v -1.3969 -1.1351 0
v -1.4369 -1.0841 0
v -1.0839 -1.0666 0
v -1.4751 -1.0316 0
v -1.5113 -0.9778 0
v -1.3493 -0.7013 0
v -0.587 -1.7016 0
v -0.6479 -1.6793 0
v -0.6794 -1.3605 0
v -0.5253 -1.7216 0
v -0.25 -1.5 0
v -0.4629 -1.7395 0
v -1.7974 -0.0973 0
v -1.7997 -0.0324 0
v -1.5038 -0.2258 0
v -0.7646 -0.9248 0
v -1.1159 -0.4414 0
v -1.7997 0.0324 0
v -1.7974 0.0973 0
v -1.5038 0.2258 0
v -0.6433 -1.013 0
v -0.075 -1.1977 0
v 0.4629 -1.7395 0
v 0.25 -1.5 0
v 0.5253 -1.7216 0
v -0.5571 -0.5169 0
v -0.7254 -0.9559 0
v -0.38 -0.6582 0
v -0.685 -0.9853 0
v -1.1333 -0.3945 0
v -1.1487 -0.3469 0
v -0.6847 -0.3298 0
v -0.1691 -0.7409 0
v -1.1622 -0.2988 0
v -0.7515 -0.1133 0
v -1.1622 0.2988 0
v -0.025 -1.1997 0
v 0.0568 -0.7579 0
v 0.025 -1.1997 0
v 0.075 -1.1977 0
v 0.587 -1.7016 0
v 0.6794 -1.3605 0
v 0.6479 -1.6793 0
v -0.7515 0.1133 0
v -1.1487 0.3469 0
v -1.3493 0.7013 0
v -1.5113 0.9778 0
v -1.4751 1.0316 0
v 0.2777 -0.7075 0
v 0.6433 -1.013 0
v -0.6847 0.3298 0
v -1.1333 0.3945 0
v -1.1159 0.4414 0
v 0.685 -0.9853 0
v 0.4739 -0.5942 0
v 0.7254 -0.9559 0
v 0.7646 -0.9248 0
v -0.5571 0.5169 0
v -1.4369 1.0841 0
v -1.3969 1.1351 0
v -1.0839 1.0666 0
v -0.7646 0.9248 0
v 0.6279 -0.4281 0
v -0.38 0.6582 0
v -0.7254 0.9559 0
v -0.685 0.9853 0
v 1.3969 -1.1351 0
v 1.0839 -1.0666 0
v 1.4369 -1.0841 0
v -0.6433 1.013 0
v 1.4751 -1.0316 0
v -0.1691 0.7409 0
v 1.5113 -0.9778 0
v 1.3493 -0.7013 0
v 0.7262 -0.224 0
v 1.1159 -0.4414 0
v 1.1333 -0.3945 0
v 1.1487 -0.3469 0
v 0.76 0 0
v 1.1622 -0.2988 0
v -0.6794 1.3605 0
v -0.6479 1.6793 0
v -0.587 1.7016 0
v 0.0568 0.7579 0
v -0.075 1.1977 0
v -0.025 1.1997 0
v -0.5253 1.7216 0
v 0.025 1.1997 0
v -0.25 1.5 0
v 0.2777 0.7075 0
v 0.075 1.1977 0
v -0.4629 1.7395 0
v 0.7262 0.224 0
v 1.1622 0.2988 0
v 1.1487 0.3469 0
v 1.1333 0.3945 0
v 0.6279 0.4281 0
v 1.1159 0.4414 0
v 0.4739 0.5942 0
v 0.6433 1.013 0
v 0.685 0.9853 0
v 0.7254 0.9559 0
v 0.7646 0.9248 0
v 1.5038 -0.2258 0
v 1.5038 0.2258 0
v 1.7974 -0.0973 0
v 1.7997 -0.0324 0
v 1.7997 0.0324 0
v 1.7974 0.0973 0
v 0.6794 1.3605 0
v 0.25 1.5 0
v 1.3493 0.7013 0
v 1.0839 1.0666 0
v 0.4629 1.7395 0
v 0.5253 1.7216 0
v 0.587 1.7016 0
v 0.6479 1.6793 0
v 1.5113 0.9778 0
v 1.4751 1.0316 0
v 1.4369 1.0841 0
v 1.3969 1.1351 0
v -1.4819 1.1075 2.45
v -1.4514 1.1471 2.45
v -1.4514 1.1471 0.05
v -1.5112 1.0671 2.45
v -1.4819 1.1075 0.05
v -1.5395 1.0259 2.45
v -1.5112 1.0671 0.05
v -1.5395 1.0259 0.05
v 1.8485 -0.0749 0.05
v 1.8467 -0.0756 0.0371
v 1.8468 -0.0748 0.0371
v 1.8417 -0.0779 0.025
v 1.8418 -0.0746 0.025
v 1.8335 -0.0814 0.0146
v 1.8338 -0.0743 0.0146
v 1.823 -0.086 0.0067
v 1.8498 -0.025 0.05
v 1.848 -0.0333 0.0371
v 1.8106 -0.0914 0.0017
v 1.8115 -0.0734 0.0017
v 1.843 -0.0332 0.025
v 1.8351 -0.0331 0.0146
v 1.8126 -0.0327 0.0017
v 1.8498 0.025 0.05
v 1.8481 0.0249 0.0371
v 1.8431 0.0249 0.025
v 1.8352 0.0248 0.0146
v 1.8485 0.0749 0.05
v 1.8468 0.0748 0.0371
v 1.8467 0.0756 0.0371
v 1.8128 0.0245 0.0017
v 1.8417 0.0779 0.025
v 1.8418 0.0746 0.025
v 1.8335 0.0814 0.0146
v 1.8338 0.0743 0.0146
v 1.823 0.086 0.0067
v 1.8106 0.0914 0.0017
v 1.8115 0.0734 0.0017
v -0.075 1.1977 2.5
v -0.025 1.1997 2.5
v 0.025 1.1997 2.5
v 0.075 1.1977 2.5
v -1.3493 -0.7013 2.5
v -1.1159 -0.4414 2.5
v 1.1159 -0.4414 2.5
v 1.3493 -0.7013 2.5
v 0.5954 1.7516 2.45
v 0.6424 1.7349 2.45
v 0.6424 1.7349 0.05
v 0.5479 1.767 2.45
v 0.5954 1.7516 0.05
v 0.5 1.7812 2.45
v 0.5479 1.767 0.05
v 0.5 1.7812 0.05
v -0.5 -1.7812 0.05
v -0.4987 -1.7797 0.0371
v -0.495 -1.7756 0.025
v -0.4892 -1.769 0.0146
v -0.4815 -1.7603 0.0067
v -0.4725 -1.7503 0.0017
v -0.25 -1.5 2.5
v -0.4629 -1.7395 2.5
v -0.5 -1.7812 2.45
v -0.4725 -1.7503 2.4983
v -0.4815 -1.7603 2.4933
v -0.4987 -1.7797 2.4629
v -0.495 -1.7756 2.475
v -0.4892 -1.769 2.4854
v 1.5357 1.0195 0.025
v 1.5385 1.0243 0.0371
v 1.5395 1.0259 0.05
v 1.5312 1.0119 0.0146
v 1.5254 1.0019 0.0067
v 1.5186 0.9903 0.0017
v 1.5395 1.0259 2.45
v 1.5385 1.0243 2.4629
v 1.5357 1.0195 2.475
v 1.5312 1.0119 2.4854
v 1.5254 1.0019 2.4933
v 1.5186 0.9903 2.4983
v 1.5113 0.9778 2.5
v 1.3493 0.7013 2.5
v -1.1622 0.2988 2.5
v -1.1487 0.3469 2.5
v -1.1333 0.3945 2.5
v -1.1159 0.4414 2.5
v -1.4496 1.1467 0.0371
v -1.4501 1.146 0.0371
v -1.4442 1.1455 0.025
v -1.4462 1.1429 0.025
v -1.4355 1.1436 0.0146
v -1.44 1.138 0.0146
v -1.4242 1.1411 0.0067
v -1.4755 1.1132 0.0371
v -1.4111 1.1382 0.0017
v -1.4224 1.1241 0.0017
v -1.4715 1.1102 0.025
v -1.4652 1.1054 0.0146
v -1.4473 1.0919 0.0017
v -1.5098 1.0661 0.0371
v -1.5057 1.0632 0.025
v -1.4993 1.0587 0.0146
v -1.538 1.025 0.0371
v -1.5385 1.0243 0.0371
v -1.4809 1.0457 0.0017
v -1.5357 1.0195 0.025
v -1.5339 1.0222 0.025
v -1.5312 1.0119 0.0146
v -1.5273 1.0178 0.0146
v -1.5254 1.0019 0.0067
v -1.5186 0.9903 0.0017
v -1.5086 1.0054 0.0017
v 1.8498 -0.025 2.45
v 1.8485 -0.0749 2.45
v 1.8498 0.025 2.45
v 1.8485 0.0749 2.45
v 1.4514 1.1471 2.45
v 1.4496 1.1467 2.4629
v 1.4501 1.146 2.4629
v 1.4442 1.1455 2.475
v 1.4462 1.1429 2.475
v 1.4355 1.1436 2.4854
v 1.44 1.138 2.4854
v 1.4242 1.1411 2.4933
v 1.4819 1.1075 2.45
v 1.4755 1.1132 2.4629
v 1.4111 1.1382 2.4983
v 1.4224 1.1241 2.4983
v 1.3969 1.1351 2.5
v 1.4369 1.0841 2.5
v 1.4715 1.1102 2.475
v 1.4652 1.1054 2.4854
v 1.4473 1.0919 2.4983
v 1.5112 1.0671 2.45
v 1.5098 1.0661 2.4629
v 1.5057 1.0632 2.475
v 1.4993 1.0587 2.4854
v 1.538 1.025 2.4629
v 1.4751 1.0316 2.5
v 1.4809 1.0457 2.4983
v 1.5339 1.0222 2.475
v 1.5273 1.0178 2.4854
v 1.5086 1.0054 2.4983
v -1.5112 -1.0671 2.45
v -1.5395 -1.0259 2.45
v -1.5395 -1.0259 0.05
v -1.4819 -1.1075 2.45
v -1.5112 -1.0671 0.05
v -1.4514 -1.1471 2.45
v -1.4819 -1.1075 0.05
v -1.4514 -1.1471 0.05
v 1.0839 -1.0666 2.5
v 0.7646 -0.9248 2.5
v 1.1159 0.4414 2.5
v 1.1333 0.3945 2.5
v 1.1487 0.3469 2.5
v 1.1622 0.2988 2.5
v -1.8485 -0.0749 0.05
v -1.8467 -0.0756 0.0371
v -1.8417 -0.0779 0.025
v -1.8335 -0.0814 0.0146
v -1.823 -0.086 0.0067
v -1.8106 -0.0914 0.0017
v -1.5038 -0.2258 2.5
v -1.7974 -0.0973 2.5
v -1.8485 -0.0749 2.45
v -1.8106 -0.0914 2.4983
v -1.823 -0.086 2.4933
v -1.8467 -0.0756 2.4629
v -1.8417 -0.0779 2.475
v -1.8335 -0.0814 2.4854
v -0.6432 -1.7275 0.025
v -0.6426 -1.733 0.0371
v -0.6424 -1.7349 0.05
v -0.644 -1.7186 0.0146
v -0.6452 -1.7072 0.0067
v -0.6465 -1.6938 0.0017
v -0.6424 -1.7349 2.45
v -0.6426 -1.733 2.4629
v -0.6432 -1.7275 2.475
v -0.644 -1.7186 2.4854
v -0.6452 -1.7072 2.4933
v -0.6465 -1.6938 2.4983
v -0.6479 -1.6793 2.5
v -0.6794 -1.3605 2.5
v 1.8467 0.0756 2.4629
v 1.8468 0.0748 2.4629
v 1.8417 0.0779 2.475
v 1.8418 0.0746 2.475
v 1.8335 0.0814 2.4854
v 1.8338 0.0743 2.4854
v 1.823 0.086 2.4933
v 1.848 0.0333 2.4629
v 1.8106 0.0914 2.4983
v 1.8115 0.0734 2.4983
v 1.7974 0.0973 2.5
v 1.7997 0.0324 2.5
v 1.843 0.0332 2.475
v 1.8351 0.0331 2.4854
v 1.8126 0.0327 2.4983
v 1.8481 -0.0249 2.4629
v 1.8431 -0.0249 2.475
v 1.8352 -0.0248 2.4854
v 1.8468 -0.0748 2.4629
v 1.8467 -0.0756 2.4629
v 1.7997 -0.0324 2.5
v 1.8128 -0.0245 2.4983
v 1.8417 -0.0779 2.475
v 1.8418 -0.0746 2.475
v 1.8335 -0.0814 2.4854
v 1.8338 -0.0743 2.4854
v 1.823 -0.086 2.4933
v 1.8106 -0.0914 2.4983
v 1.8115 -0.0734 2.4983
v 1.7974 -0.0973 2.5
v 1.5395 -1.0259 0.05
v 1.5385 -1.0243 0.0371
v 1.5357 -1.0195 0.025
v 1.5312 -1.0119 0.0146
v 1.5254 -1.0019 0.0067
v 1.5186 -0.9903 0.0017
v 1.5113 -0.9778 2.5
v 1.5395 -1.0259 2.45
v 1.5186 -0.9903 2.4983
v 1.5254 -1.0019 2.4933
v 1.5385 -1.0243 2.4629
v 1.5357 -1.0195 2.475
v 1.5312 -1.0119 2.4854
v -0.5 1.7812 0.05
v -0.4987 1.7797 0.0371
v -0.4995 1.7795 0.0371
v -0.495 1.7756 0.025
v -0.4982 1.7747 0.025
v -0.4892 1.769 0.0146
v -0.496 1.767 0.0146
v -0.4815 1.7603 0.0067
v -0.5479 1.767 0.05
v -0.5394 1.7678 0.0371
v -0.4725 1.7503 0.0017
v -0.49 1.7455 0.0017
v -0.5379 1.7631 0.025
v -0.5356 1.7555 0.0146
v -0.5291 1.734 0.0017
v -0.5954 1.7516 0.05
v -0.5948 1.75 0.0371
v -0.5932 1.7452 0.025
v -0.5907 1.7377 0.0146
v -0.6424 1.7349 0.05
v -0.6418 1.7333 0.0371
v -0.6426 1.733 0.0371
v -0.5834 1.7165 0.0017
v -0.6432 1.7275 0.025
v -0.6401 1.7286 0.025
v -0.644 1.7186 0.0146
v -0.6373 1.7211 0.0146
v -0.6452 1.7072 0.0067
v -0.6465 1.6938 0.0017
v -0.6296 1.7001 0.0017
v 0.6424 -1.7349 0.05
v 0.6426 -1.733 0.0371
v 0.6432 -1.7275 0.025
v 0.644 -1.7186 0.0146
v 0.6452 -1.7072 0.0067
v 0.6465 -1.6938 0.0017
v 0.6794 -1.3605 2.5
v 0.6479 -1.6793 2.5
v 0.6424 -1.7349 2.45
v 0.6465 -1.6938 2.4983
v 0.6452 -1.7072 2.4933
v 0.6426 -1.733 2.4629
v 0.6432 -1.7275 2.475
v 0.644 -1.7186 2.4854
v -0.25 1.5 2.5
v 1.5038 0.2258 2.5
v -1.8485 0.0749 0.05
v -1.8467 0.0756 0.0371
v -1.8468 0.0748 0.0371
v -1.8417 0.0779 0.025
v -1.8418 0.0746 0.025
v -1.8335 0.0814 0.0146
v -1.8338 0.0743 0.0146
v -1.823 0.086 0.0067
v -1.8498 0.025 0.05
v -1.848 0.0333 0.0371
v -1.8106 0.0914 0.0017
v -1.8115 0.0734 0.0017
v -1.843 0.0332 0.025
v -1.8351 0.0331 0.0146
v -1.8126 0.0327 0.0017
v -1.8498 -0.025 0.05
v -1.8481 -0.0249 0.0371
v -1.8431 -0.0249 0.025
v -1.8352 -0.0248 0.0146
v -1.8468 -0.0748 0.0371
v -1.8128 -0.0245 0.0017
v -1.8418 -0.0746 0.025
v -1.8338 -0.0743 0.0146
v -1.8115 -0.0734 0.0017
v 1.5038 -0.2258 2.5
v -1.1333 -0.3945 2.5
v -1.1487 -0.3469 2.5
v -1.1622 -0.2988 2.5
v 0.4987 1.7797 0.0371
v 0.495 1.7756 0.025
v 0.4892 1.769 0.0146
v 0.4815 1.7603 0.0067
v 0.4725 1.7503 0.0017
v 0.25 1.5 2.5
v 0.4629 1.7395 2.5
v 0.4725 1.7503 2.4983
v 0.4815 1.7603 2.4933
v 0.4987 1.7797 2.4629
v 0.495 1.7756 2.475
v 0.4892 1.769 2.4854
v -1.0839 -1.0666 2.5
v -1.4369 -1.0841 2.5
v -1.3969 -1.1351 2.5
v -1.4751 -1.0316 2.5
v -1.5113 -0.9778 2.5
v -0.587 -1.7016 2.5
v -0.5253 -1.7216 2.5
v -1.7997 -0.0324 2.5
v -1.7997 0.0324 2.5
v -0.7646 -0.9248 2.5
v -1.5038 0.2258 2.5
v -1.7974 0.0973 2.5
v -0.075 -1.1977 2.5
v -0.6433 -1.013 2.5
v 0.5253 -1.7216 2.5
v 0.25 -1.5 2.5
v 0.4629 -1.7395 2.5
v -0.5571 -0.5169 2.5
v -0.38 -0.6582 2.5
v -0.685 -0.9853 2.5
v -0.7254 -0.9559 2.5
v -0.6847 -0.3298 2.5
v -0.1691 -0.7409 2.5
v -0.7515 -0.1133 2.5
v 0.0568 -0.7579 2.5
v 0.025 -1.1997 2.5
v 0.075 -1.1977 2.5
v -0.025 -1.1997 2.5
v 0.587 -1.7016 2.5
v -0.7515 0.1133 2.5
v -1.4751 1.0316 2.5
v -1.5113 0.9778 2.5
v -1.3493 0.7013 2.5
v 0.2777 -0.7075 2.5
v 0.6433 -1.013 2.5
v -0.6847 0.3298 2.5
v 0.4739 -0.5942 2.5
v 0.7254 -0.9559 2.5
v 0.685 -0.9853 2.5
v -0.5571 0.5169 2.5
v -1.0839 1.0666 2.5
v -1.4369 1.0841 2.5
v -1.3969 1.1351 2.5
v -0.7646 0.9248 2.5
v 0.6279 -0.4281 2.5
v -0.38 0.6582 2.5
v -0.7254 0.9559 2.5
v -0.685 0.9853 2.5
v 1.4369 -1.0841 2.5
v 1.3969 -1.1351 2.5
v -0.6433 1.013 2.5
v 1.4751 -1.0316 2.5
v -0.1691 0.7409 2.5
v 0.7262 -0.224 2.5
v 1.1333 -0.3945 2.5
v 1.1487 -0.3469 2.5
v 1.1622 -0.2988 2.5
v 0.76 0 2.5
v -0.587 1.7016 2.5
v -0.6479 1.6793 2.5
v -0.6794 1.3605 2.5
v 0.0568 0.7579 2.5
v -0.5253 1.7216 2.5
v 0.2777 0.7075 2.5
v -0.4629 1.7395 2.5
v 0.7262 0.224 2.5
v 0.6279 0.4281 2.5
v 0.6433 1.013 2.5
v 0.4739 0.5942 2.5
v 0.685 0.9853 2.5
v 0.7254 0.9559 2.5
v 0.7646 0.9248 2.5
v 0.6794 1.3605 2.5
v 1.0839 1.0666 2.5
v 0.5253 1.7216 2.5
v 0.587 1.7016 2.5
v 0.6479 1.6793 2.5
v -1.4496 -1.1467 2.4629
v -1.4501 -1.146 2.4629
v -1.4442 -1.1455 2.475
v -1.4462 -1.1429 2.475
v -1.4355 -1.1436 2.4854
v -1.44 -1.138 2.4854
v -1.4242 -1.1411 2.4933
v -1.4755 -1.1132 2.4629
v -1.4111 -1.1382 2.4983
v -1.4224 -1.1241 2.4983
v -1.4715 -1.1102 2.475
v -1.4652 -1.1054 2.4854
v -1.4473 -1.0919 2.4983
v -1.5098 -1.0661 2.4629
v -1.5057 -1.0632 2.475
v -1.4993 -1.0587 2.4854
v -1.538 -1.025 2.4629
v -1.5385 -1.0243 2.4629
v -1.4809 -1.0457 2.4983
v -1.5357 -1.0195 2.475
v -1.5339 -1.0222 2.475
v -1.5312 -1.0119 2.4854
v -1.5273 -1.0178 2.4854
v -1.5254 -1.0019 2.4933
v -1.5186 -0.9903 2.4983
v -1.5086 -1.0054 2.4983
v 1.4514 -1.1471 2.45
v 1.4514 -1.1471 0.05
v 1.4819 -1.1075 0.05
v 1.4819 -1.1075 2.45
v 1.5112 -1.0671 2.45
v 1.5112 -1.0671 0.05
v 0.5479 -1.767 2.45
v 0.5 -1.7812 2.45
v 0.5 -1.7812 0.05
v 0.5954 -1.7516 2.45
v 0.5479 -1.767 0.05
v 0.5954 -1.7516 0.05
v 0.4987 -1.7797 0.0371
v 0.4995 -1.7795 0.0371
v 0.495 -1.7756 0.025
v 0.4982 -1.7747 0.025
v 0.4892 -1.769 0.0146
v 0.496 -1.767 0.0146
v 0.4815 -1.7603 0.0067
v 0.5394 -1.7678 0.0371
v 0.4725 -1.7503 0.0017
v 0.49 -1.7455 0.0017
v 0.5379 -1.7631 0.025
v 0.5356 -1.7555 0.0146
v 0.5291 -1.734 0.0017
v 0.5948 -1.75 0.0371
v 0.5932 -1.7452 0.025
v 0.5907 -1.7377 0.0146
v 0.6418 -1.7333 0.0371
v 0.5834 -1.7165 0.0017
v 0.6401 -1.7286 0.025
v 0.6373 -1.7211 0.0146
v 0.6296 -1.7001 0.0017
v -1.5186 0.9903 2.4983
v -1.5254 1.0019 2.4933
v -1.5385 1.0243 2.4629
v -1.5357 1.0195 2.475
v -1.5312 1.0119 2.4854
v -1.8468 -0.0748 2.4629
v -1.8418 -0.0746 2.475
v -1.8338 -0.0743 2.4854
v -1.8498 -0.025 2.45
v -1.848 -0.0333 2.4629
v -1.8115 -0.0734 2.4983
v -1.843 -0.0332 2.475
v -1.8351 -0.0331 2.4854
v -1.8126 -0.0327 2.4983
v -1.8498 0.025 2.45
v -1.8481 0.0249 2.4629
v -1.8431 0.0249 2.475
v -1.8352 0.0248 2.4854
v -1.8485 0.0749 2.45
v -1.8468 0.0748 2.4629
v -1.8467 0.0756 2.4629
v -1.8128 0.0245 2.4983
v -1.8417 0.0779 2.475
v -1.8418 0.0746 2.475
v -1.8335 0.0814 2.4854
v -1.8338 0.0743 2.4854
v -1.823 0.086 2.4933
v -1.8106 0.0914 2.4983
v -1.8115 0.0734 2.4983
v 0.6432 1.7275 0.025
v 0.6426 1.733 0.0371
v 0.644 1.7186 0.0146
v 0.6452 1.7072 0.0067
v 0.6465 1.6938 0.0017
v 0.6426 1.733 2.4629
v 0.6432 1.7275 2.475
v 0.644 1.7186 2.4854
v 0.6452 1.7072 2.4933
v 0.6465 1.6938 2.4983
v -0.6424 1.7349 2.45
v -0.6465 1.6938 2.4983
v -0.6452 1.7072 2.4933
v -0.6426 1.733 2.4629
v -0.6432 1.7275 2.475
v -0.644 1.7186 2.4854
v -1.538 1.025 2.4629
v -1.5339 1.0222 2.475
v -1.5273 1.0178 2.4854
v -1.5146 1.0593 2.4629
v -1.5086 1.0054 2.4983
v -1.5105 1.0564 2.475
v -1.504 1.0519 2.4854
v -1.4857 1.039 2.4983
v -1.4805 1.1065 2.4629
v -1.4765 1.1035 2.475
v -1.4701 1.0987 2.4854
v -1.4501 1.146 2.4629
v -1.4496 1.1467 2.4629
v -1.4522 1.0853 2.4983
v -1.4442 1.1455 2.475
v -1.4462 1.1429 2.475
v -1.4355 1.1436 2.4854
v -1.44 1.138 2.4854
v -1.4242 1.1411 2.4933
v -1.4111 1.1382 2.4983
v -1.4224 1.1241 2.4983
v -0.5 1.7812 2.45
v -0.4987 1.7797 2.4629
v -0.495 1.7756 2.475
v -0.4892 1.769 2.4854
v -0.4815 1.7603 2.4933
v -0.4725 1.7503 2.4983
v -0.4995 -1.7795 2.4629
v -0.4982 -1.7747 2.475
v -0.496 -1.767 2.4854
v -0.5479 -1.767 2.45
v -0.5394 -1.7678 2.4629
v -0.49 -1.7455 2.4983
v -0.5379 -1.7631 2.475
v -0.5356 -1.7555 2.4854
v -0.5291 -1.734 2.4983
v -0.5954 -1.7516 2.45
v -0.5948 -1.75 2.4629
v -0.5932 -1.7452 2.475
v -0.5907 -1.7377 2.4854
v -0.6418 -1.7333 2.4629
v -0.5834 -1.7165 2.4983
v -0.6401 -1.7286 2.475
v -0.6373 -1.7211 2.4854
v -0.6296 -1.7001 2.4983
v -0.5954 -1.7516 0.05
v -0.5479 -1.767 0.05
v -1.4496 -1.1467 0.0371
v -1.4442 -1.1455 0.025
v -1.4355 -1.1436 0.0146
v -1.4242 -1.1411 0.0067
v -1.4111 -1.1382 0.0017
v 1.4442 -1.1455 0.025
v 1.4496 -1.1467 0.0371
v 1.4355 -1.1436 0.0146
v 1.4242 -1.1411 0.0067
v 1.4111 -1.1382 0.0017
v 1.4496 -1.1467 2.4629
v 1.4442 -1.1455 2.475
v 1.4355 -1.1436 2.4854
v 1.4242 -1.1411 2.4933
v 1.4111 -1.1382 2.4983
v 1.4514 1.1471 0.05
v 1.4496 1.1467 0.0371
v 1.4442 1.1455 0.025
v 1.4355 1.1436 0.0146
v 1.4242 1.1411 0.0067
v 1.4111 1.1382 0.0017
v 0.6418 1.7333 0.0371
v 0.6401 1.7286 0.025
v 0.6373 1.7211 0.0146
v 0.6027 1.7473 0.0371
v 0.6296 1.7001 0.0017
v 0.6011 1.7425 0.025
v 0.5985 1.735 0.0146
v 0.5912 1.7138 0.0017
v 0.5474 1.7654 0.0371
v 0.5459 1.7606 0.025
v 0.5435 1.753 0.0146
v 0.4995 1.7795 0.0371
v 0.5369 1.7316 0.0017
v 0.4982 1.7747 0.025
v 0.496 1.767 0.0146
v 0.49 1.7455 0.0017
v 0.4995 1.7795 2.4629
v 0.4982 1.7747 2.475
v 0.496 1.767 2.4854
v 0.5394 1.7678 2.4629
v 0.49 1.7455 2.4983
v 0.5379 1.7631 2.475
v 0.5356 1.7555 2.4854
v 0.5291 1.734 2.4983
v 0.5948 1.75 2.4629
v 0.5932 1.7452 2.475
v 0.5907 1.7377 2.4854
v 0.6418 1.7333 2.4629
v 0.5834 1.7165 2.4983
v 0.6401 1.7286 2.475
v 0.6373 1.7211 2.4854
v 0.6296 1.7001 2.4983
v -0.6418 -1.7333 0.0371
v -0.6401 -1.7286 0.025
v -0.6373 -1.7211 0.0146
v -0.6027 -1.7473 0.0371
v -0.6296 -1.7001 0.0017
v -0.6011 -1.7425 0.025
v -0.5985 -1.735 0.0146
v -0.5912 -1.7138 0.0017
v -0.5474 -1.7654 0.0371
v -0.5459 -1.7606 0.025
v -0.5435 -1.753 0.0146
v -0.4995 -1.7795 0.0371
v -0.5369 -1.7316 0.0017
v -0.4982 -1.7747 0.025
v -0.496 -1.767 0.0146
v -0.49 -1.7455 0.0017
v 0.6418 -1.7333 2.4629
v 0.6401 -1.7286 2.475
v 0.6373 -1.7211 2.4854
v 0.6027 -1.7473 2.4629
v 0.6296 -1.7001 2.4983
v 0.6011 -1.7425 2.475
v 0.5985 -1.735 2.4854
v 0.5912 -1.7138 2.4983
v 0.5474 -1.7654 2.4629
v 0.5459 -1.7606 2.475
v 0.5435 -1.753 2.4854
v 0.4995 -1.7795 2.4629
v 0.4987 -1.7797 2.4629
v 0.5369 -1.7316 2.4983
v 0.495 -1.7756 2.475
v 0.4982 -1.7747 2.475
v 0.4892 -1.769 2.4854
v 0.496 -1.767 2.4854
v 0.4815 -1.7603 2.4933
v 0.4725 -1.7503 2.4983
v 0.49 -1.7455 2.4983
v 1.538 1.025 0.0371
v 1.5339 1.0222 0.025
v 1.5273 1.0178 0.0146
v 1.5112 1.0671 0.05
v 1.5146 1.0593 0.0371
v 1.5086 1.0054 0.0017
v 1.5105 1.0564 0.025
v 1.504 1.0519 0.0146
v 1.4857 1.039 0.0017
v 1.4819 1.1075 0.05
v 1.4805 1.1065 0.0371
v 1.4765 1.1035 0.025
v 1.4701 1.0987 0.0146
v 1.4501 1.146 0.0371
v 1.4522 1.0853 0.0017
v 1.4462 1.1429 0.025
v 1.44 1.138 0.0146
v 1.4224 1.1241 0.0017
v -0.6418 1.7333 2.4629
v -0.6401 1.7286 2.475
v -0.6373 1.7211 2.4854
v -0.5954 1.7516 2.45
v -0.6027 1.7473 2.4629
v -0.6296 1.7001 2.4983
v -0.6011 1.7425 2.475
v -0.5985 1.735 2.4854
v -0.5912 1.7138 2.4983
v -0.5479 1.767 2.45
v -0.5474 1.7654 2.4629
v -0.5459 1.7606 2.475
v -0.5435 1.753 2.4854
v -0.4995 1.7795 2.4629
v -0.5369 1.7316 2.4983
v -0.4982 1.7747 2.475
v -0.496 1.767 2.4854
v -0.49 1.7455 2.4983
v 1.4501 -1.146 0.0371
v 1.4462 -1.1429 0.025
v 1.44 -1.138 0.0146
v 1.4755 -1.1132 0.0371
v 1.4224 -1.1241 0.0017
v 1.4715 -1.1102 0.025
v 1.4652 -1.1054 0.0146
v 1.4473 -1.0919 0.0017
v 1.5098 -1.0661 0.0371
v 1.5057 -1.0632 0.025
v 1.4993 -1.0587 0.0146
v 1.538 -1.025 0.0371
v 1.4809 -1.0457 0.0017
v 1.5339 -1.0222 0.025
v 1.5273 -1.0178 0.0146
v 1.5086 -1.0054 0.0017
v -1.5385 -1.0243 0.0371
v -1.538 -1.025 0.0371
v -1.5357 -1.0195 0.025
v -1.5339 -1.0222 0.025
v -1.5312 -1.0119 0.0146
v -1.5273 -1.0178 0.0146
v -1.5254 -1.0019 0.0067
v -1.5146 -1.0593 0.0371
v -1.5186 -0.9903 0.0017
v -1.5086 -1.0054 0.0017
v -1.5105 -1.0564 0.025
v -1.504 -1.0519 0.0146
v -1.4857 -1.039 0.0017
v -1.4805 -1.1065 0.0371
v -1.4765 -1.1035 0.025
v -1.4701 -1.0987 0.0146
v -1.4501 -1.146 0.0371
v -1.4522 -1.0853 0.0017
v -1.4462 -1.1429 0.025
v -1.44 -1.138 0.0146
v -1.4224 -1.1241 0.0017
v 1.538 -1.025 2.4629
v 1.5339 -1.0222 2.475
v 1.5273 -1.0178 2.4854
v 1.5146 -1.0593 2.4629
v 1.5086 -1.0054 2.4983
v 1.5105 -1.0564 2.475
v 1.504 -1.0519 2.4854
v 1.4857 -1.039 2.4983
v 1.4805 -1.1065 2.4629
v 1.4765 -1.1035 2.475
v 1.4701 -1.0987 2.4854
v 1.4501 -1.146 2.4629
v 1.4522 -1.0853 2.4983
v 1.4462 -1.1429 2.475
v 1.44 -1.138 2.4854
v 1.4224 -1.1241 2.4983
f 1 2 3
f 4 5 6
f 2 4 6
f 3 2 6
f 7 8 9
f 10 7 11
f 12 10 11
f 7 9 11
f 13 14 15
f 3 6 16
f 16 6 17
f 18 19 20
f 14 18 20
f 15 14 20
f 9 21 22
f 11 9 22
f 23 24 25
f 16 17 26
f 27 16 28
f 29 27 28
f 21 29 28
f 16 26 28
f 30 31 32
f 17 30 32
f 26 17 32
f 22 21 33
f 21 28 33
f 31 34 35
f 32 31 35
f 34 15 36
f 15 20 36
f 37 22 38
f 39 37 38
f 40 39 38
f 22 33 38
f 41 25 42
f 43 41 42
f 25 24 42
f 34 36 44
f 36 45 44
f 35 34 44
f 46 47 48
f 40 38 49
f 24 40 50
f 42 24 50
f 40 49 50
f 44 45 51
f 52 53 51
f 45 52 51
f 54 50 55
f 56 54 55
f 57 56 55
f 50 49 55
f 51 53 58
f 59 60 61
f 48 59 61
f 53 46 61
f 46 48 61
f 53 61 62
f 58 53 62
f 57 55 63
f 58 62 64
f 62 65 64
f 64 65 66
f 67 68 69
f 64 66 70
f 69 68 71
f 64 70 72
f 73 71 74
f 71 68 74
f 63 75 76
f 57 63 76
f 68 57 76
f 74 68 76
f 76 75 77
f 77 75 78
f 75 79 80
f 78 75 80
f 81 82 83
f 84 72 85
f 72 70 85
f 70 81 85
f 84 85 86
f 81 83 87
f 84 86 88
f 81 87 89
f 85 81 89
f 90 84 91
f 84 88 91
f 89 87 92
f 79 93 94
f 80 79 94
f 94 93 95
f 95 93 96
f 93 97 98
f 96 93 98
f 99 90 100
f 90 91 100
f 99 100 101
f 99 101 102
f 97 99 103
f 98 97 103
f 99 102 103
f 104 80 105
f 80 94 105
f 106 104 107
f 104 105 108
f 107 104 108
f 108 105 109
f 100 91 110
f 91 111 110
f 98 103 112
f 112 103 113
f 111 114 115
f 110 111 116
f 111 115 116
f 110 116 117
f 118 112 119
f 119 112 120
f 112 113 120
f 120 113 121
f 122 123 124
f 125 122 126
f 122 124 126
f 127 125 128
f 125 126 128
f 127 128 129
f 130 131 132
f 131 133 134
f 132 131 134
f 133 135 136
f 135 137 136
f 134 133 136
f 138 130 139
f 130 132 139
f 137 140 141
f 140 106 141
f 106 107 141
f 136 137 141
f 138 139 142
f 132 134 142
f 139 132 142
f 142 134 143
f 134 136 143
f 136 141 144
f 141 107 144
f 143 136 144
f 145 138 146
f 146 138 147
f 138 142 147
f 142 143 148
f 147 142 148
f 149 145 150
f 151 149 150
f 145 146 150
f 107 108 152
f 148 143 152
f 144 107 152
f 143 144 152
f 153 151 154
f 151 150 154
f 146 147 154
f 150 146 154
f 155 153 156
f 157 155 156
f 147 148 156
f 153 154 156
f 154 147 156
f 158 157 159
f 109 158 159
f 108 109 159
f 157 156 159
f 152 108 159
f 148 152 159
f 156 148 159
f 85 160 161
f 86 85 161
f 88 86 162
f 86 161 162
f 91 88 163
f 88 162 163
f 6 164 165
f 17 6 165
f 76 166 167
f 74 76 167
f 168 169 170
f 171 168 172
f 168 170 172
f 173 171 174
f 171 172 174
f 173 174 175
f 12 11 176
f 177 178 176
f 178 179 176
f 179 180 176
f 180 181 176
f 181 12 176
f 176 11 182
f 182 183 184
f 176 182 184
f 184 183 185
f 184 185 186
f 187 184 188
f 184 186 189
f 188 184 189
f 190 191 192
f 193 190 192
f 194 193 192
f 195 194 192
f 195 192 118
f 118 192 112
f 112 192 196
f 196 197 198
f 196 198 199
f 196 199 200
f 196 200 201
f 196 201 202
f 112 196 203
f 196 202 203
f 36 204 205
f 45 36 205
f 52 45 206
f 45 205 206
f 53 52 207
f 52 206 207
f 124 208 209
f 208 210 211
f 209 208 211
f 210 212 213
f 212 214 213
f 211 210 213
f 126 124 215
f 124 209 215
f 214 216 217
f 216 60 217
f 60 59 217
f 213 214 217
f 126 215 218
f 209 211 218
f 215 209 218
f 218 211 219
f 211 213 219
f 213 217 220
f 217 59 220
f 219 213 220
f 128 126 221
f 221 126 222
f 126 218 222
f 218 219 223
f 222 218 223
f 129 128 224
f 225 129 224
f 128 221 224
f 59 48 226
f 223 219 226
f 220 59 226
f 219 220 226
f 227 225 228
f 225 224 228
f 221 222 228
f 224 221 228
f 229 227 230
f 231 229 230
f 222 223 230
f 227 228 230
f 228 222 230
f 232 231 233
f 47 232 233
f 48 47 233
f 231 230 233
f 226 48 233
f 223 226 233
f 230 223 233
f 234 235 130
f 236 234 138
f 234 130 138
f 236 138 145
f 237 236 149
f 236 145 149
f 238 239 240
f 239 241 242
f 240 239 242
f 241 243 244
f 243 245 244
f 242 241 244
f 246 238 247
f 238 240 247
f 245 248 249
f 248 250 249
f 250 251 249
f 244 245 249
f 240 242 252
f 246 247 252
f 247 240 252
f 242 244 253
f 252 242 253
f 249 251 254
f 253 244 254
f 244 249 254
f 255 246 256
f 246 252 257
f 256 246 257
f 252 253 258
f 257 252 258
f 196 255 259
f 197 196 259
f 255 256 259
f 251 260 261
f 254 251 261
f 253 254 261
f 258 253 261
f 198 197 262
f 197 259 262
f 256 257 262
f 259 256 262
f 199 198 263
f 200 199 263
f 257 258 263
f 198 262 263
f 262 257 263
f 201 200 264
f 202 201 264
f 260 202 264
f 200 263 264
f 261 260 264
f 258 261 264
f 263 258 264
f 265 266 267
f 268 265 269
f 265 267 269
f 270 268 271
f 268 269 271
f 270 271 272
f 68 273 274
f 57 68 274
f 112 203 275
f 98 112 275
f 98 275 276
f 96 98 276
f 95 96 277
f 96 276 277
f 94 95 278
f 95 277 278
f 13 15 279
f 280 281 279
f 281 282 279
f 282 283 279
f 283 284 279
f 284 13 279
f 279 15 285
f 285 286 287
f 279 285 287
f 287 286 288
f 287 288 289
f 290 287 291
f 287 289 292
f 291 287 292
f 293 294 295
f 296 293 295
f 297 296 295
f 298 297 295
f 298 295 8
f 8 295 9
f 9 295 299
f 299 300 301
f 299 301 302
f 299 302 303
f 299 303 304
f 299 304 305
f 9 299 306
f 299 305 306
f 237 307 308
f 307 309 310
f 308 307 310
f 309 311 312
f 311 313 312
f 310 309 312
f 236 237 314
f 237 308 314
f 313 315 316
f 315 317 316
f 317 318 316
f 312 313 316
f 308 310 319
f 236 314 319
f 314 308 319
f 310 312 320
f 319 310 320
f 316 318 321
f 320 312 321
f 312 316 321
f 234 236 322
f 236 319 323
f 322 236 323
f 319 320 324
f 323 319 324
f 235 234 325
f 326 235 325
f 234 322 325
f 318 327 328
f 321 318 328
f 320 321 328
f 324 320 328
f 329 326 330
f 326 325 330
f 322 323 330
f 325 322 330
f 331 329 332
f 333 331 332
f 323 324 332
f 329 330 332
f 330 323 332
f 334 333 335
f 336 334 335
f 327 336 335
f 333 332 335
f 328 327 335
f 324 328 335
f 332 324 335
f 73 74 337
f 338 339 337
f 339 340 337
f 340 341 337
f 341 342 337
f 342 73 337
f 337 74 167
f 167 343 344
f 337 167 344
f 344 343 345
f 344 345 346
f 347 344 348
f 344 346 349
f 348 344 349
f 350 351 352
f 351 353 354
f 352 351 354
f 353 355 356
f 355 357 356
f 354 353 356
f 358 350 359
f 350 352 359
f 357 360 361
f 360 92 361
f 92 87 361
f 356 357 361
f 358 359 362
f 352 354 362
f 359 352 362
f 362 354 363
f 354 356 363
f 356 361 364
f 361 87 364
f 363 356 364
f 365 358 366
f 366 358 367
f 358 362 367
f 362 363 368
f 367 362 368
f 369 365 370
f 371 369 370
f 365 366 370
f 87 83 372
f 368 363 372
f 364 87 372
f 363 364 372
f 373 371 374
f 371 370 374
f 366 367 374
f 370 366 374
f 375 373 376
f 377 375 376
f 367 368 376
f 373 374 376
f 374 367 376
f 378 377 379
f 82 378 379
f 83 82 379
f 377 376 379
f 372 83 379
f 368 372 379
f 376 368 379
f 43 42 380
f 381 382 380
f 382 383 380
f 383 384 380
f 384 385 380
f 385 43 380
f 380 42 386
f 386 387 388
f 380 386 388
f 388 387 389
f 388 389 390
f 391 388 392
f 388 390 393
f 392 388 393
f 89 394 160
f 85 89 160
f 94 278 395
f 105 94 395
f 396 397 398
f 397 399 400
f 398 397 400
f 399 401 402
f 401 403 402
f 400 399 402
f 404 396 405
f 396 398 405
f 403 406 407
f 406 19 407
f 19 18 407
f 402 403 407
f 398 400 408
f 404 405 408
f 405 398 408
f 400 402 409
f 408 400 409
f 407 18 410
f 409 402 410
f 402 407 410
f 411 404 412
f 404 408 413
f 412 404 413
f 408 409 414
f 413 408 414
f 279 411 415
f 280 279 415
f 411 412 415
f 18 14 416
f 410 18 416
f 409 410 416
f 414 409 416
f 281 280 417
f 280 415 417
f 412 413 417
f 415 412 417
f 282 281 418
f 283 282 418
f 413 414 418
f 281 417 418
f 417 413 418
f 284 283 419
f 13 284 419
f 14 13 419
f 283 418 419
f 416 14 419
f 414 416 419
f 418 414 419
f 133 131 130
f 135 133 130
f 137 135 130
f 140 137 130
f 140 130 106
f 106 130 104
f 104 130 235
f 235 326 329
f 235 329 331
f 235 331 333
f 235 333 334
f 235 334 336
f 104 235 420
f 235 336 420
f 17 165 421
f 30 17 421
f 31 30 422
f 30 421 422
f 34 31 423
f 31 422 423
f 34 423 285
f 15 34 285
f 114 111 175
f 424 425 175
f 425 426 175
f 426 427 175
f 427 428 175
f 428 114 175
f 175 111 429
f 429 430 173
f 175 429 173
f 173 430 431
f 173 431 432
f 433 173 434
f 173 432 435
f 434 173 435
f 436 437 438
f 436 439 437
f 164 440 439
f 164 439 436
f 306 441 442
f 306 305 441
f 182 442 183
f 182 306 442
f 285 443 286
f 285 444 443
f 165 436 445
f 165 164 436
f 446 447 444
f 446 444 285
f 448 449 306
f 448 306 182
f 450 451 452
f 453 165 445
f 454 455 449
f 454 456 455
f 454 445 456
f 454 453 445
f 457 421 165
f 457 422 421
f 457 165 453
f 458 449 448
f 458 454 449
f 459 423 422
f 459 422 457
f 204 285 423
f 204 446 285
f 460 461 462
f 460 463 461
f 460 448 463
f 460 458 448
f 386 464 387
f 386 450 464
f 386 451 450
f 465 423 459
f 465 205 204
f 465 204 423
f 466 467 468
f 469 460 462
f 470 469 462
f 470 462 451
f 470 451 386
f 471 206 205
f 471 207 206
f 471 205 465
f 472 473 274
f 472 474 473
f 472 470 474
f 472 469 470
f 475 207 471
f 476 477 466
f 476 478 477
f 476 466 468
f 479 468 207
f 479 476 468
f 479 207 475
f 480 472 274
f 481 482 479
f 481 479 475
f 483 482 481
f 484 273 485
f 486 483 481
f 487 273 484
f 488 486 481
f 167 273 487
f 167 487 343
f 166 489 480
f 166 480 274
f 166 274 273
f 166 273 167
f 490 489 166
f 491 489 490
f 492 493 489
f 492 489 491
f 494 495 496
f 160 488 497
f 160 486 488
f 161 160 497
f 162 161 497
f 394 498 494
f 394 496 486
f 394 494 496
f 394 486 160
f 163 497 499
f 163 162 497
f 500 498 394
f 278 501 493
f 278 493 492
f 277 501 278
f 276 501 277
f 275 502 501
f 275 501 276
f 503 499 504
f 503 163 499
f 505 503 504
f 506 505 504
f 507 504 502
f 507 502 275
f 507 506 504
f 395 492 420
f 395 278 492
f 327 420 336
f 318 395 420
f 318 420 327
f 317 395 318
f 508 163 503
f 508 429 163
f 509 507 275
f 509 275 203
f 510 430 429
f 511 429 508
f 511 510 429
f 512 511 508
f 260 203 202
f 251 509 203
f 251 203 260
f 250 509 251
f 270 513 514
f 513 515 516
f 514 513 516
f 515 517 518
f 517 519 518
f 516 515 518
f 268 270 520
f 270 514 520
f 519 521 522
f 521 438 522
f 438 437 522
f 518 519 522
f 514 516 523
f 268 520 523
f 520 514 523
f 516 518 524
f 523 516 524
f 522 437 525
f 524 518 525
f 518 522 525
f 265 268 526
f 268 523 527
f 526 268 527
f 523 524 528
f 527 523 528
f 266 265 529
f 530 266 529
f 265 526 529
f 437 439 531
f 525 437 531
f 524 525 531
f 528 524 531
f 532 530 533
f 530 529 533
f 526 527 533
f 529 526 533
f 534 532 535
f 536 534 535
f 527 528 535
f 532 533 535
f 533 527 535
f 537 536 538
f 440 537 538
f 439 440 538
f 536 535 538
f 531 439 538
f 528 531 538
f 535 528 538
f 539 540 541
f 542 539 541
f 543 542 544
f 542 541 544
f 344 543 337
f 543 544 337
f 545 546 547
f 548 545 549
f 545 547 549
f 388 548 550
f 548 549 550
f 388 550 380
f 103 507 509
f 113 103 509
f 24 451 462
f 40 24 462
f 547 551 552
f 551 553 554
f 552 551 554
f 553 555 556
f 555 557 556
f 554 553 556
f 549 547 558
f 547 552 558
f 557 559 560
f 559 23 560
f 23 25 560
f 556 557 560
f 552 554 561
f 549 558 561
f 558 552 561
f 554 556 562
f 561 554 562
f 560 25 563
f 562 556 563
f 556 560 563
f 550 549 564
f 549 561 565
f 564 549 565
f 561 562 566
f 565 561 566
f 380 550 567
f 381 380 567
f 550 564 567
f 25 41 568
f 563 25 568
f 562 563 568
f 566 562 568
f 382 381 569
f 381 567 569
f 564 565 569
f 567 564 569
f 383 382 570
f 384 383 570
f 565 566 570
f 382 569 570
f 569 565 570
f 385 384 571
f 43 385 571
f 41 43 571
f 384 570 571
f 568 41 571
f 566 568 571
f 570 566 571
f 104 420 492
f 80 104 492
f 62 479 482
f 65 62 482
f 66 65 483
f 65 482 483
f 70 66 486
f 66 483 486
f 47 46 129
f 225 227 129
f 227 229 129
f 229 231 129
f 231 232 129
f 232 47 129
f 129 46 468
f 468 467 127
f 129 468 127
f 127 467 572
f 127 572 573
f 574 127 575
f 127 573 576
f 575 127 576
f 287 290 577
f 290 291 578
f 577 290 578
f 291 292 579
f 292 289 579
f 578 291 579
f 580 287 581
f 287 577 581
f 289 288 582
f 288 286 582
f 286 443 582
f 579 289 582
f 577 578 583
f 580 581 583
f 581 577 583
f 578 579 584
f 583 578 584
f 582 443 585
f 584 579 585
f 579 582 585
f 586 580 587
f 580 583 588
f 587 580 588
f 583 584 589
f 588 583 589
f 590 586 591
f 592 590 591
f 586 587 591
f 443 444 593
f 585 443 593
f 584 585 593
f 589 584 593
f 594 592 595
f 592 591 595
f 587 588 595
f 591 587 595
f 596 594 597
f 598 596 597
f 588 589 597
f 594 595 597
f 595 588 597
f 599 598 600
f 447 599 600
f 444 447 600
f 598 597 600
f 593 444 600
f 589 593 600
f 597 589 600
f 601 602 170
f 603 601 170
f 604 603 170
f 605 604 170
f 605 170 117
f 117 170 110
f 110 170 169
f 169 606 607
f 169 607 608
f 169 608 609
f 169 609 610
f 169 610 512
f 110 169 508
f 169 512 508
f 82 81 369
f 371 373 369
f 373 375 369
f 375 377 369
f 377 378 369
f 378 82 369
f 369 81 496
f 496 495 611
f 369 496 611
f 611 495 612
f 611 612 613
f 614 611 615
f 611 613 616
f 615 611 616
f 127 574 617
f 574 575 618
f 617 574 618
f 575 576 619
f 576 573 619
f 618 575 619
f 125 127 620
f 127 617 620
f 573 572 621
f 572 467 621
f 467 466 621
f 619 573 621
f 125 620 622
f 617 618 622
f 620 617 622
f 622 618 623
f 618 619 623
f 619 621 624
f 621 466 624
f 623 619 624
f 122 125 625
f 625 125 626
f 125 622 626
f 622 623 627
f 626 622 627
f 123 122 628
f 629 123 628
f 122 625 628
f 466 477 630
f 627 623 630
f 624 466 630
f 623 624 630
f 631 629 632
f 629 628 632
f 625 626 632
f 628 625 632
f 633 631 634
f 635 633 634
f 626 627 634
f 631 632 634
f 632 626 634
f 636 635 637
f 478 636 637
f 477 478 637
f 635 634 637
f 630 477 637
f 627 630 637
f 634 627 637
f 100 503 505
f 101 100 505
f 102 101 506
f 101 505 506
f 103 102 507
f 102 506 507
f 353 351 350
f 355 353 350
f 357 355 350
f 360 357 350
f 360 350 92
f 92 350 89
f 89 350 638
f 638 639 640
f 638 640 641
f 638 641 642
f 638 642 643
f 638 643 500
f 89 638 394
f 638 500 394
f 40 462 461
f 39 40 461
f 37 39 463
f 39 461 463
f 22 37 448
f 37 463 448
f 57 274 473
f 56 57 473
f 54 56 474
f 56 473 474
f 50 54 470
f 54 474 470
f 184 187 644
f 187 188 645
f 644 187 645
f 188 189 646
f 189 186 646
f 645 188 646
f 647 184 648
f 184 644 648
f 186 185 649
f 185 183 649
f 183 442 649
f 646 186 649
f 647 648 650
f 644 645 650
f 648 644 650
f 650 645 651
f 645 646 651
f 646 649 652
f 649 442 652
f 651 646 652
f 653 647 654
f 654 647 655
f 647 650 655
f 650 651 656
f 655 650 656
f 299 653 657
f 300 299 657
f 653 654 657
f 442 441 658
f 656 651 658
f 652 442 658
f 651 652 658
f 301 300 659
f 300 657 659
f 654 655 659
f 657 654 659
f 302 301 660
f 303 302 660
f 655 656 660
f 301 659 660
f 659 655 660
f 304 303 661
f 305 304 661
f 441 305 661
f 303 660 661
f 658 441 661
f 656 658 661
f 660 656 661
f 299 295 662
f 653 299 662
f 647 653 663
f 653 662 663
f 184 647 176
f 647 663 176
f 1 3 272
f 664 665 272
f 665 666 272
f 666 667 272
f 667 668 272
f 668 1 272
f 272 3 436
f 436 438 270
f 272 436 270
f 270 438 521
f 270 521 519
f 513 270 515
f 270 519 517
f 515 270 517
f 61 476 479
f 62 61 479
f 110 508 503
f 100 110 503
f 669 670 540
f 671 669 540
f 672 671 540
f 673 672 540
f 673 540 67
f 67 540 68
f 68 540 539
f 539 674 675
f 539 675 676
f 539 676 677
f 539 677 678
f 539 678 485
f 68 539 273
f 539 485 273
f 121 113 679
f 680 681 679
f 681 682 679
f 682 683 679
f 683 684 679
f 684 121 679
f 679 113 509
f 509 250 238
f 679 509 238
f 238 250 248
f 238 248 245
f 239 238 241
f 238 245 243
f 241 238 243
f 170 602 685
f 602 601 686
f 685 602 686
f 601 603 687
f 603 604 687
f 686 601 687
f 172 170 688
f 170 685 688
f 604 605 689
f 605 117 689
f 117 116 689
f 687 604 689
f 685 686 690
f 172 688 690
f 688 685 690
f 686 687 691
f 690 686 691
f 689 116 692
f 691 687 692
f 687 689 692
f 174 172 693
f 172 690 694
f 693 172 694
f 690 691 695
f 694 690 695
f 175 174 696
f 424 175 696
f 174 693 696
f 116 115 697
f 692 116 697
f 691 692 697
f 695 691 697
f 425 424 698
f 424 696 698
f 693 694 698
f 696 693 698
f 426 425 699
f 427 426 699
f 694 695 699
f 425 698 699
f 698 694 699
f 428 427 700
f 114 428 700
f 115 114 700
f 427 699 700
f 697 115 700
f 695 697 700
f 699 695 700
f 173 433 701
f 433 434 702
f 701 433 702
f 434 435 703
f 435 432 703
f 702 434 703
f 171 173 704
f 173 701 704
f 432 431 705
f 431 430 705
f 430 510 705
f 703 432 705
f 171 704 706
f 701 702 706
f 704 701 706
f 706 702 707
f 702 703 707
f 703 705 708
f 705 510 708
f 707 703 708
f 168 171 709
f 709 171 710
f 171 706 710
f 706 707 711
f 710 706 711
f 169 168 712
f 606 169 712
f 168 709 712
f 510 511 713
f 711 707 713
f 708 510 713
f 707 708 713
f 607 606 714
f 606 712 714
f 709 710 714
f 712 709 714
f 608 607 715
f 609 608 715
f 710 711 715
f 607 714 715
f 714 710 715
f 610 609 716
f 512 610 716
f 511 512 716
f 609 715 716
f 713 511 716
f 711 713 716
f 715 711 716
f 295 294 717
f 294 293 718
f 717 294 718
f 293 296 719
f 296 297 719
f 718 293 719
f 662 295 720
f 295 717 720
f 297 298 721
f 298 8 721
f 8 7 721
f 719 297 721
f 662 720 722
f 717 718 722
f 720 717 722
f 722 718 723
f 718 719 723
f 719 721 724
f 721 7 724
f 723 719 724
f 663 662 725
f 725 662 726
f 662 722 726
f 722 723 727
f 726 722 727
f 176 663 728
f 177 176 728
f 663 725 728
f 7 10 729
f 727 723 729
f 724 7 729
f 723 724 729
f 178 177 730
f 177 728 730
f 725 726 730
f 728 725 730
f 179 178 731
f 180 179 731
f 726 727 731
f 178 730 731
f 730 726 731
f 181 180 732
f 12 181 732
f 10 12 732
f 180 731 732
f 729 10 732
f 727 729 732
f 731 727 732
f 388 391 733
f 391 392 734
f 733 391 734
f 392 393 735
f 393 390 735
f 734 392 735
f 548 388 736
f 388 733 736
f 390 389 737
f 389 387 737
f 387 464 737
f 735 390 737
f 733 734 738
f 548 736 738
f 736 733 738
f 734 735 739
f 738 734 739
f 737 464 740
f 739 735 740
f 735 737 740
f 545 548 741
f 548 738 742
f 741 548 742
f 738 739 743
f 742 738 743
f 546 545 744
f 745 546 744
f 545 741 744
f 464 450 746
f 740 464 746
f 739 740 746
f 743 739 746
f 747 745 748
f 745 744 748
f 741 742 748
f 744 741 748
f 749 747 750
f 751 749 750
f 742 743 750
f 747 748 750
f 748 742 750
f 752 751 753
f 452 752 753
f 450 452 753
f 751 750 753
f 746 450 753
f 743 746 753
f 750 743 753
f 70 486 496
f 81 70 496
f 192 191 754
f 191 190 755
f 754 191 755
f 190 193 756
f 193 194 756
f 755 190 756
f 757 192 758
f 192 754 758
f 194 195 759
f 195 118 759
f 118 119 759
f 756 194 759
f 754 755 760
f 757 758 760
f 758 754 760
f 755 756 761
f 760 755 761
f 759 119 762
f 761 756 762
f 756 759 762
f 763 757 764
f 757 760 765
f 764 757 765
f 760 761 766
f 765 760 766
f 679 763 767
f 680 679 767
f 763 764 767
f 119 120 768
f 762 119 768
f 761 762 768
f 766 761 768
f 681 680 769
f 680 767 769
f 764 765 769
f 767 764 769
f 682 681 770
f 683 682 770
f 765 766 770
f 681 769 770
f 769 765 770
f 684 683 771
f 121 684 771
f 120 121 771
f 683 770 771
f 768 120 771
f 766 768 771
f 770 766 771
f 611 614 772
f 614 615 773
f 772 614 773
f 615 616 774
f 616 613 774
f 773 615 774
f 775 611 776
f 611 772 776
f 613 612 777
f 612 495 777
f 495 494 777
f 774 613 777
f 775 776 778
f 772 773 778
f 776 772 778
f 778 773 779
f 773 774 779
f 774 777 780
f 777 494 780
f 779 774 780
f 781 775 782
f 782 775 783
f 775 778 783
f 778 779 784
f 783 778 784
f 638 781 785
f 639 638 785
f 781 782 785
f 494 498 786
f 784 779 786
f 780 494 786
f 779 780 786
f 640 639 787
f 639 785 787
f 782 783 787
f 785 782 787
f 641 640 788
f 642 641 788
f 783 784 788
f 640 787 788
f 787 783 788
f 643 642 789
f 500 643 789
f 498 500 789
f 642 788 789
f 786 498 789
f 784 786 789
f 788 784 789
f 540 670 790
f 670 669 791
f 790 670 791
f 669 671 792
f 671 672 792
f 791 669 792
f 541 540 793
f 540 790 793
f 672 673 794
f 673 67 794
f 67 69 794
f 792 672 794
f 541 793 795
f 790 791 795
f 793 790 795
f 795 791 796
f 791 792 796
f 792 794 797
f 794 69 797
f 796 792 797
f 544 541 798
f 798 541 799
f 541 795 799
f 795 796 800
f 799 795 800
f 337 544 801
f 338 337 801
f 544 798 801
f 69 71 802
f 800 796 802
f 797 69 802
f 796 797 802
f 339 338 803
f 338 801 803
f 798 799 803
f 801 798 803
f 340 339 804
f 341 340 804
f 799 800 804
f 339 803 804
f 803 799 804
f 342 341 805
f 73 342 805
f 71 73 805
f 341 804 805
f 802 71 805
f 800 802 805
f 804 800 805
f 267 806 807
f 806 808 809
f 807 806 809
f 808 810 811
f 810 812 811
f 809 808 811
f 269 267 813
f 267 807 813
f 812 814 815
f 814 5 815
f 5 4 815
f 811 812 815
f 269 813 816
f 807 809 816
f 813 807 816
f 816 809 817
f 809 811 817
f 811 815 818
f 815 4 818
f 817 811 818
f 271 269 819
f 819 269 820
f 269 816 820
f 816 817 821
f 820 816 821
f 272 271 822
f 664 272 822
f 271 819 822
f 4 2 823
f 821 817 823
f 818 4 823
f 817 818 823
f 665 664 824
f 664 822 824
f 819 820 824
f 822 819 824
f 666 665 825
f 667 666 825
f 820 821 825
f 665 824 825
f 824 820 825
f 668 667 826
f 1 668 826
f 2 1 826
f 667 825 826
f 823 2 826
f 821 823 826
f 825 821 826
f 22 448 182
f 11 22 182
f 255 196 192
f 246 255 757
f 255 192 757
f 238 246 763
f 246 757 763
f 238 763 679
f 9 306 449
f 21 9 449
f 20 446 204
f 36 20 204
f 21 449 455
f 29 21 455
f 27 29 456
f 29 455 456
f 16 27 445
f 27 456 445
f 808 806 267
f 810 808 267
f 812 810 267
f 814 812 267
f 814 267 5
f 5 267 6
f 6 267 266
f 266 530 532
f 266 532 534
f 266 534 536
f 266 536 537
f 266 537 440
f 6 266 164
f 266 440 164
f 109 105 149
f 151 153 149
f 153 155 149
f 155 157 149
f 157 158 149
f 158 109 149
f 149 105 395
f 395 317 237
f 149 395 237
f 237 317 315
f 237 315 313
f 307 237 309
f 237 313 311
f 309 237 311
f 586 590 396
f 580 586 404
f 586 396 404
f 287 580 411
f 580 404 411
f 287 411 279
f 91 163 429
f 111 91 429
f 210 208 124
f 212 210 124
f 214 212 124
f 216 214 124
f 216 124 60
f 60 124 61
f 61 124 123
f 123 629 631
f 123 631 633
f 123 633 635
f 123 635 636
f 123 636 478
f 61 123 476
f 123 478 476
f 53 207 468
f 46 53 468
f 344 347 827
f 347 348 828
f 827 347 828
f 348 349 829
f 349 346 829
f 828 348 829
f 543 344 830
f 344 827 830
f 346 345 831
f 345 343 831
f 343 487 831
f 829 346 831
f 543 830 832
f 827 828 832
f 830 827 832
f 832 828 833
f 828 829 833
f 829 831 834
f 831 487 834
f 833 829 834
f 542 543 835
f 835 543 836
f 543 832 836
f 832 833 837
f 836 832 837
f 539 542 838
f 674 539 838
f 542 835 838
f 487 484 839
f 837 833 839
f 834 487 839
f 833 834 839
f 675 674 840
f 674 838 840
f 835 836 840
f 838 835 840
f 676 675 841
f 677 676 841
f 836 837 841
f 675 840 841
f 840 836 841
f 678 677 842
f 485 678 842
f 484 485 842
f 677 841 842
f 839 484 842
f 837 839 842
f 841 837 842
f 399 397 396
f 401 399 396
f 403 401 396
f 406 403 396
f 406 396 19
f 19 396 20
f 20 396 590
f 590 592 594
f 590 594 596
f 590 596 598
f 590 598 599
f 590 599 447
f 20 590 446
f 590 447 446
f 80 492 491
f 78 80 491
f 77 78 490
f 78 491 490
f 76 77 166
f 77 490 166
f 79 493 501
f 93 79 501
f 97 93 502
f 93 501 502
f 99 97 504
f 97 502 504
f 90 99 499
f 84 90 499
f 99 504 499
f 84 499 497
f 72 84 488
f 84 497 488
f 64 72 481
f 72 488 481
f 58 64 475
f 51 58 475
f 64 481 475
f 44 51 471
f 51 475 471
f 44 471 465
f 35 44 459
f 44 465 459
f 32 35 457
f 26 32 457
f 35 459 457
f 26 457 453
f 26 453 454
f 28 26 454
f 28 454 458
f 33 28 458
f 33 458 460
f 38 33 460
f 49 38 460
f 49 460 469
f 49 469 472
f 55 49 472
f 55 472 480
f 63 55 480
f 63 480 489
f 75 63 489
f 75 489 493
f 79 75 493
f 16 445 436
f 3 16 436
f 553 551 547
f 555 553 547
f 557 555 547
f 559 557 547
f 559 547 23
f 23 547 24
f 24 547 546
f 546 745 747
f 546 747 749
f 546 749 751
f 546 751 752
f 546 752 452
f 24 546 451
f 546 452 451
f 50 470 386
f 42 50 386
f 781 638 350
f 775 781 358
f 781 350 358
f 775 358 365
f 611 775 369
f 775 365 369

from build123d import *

# Parameters (mm, degrees)
CROQUIS1_R              = 1.85
SALIENTE_EXTRUIR1_DEPTH = 2.5
CORTAR_EXTRUIR1_DEPTH   = 2.85
REDONDEO1_R             = 0.05
MATRIZC1_COUNT          = 10
CROQUIS2_3_R            = 0.76
CORTAR_EXTRUIR2_DEPTH   = 2.85


with BuildPart() as part:
    # Croquis1 → Saliente-Extruir1 (new body)
    with BuildSketch(Plane.XY):
        Circle(CROQUIS1_R)
    extrude(amount=SALIENTE_EXTRUIR1_DEPTH)

    # Croquis2 → Cortar-Extruir1 (cut)
    with BuildSketch(Plane.XY.offset(2.5)):
        with BuildLine():
            Line((0.5, 1.781151313), (0.5, 2.25))
            Line((0.5, 2.25), (-0.5, 2.25))
            Line((-0.5, 2.25), (-0.5, 1.781151313))
            Line((-0.5, 1.781151313), (-0.25, 1.5))
            Line((-0.25, 1.5), (-0.075, 1.197653957))
            ThreePointArc((-0.075, 1.197653957), (0, 1.2), (0.075, 1.197653957))
            Line((0.075, 1.197653957), (0.25, 1.5))
            Line((0.25, 1.5), (0.5, 1.781151313))
        make_face()
    cortar_extruir1 = extrude(amount=-CORTAR_EXTRUIR1_DEPTH, mode=Mode.SUBTRACT)

    # Redondeo1
    redondeo1_edges = [part.edges().sort_by_distance(p)[0] for p in [
        (0, -1.85, 0),
        (0, -1.85, 2.5),
    ]]
    fillet(redondeo1_edges, radius=REDONDEO1_R)

    # MatrizC1: Cortar-Extruir1 ×10 about axis
    matrizc1_axis = Axis((0, 0, 0), (0, 0, 1))
    for i in range(1, MATRIZC1_COUNT):
        add(cortar_extruir1.rotate(matrizc1_axis, i * 360 / MATRIZC1_COUNT), mode=Mode.SUBTRACT)

    # Croquis2_3 → Cortar-Extruir2 (cut)
    with BuildSketch(Plane.XY.offset(2.5)):
        Circle(CROQUIS2_3_R)
    extrude(amount=-CORTAR_EXTRUIR2_DEPTH, mode=Mode.SUBTRACT)


solid = part.part
